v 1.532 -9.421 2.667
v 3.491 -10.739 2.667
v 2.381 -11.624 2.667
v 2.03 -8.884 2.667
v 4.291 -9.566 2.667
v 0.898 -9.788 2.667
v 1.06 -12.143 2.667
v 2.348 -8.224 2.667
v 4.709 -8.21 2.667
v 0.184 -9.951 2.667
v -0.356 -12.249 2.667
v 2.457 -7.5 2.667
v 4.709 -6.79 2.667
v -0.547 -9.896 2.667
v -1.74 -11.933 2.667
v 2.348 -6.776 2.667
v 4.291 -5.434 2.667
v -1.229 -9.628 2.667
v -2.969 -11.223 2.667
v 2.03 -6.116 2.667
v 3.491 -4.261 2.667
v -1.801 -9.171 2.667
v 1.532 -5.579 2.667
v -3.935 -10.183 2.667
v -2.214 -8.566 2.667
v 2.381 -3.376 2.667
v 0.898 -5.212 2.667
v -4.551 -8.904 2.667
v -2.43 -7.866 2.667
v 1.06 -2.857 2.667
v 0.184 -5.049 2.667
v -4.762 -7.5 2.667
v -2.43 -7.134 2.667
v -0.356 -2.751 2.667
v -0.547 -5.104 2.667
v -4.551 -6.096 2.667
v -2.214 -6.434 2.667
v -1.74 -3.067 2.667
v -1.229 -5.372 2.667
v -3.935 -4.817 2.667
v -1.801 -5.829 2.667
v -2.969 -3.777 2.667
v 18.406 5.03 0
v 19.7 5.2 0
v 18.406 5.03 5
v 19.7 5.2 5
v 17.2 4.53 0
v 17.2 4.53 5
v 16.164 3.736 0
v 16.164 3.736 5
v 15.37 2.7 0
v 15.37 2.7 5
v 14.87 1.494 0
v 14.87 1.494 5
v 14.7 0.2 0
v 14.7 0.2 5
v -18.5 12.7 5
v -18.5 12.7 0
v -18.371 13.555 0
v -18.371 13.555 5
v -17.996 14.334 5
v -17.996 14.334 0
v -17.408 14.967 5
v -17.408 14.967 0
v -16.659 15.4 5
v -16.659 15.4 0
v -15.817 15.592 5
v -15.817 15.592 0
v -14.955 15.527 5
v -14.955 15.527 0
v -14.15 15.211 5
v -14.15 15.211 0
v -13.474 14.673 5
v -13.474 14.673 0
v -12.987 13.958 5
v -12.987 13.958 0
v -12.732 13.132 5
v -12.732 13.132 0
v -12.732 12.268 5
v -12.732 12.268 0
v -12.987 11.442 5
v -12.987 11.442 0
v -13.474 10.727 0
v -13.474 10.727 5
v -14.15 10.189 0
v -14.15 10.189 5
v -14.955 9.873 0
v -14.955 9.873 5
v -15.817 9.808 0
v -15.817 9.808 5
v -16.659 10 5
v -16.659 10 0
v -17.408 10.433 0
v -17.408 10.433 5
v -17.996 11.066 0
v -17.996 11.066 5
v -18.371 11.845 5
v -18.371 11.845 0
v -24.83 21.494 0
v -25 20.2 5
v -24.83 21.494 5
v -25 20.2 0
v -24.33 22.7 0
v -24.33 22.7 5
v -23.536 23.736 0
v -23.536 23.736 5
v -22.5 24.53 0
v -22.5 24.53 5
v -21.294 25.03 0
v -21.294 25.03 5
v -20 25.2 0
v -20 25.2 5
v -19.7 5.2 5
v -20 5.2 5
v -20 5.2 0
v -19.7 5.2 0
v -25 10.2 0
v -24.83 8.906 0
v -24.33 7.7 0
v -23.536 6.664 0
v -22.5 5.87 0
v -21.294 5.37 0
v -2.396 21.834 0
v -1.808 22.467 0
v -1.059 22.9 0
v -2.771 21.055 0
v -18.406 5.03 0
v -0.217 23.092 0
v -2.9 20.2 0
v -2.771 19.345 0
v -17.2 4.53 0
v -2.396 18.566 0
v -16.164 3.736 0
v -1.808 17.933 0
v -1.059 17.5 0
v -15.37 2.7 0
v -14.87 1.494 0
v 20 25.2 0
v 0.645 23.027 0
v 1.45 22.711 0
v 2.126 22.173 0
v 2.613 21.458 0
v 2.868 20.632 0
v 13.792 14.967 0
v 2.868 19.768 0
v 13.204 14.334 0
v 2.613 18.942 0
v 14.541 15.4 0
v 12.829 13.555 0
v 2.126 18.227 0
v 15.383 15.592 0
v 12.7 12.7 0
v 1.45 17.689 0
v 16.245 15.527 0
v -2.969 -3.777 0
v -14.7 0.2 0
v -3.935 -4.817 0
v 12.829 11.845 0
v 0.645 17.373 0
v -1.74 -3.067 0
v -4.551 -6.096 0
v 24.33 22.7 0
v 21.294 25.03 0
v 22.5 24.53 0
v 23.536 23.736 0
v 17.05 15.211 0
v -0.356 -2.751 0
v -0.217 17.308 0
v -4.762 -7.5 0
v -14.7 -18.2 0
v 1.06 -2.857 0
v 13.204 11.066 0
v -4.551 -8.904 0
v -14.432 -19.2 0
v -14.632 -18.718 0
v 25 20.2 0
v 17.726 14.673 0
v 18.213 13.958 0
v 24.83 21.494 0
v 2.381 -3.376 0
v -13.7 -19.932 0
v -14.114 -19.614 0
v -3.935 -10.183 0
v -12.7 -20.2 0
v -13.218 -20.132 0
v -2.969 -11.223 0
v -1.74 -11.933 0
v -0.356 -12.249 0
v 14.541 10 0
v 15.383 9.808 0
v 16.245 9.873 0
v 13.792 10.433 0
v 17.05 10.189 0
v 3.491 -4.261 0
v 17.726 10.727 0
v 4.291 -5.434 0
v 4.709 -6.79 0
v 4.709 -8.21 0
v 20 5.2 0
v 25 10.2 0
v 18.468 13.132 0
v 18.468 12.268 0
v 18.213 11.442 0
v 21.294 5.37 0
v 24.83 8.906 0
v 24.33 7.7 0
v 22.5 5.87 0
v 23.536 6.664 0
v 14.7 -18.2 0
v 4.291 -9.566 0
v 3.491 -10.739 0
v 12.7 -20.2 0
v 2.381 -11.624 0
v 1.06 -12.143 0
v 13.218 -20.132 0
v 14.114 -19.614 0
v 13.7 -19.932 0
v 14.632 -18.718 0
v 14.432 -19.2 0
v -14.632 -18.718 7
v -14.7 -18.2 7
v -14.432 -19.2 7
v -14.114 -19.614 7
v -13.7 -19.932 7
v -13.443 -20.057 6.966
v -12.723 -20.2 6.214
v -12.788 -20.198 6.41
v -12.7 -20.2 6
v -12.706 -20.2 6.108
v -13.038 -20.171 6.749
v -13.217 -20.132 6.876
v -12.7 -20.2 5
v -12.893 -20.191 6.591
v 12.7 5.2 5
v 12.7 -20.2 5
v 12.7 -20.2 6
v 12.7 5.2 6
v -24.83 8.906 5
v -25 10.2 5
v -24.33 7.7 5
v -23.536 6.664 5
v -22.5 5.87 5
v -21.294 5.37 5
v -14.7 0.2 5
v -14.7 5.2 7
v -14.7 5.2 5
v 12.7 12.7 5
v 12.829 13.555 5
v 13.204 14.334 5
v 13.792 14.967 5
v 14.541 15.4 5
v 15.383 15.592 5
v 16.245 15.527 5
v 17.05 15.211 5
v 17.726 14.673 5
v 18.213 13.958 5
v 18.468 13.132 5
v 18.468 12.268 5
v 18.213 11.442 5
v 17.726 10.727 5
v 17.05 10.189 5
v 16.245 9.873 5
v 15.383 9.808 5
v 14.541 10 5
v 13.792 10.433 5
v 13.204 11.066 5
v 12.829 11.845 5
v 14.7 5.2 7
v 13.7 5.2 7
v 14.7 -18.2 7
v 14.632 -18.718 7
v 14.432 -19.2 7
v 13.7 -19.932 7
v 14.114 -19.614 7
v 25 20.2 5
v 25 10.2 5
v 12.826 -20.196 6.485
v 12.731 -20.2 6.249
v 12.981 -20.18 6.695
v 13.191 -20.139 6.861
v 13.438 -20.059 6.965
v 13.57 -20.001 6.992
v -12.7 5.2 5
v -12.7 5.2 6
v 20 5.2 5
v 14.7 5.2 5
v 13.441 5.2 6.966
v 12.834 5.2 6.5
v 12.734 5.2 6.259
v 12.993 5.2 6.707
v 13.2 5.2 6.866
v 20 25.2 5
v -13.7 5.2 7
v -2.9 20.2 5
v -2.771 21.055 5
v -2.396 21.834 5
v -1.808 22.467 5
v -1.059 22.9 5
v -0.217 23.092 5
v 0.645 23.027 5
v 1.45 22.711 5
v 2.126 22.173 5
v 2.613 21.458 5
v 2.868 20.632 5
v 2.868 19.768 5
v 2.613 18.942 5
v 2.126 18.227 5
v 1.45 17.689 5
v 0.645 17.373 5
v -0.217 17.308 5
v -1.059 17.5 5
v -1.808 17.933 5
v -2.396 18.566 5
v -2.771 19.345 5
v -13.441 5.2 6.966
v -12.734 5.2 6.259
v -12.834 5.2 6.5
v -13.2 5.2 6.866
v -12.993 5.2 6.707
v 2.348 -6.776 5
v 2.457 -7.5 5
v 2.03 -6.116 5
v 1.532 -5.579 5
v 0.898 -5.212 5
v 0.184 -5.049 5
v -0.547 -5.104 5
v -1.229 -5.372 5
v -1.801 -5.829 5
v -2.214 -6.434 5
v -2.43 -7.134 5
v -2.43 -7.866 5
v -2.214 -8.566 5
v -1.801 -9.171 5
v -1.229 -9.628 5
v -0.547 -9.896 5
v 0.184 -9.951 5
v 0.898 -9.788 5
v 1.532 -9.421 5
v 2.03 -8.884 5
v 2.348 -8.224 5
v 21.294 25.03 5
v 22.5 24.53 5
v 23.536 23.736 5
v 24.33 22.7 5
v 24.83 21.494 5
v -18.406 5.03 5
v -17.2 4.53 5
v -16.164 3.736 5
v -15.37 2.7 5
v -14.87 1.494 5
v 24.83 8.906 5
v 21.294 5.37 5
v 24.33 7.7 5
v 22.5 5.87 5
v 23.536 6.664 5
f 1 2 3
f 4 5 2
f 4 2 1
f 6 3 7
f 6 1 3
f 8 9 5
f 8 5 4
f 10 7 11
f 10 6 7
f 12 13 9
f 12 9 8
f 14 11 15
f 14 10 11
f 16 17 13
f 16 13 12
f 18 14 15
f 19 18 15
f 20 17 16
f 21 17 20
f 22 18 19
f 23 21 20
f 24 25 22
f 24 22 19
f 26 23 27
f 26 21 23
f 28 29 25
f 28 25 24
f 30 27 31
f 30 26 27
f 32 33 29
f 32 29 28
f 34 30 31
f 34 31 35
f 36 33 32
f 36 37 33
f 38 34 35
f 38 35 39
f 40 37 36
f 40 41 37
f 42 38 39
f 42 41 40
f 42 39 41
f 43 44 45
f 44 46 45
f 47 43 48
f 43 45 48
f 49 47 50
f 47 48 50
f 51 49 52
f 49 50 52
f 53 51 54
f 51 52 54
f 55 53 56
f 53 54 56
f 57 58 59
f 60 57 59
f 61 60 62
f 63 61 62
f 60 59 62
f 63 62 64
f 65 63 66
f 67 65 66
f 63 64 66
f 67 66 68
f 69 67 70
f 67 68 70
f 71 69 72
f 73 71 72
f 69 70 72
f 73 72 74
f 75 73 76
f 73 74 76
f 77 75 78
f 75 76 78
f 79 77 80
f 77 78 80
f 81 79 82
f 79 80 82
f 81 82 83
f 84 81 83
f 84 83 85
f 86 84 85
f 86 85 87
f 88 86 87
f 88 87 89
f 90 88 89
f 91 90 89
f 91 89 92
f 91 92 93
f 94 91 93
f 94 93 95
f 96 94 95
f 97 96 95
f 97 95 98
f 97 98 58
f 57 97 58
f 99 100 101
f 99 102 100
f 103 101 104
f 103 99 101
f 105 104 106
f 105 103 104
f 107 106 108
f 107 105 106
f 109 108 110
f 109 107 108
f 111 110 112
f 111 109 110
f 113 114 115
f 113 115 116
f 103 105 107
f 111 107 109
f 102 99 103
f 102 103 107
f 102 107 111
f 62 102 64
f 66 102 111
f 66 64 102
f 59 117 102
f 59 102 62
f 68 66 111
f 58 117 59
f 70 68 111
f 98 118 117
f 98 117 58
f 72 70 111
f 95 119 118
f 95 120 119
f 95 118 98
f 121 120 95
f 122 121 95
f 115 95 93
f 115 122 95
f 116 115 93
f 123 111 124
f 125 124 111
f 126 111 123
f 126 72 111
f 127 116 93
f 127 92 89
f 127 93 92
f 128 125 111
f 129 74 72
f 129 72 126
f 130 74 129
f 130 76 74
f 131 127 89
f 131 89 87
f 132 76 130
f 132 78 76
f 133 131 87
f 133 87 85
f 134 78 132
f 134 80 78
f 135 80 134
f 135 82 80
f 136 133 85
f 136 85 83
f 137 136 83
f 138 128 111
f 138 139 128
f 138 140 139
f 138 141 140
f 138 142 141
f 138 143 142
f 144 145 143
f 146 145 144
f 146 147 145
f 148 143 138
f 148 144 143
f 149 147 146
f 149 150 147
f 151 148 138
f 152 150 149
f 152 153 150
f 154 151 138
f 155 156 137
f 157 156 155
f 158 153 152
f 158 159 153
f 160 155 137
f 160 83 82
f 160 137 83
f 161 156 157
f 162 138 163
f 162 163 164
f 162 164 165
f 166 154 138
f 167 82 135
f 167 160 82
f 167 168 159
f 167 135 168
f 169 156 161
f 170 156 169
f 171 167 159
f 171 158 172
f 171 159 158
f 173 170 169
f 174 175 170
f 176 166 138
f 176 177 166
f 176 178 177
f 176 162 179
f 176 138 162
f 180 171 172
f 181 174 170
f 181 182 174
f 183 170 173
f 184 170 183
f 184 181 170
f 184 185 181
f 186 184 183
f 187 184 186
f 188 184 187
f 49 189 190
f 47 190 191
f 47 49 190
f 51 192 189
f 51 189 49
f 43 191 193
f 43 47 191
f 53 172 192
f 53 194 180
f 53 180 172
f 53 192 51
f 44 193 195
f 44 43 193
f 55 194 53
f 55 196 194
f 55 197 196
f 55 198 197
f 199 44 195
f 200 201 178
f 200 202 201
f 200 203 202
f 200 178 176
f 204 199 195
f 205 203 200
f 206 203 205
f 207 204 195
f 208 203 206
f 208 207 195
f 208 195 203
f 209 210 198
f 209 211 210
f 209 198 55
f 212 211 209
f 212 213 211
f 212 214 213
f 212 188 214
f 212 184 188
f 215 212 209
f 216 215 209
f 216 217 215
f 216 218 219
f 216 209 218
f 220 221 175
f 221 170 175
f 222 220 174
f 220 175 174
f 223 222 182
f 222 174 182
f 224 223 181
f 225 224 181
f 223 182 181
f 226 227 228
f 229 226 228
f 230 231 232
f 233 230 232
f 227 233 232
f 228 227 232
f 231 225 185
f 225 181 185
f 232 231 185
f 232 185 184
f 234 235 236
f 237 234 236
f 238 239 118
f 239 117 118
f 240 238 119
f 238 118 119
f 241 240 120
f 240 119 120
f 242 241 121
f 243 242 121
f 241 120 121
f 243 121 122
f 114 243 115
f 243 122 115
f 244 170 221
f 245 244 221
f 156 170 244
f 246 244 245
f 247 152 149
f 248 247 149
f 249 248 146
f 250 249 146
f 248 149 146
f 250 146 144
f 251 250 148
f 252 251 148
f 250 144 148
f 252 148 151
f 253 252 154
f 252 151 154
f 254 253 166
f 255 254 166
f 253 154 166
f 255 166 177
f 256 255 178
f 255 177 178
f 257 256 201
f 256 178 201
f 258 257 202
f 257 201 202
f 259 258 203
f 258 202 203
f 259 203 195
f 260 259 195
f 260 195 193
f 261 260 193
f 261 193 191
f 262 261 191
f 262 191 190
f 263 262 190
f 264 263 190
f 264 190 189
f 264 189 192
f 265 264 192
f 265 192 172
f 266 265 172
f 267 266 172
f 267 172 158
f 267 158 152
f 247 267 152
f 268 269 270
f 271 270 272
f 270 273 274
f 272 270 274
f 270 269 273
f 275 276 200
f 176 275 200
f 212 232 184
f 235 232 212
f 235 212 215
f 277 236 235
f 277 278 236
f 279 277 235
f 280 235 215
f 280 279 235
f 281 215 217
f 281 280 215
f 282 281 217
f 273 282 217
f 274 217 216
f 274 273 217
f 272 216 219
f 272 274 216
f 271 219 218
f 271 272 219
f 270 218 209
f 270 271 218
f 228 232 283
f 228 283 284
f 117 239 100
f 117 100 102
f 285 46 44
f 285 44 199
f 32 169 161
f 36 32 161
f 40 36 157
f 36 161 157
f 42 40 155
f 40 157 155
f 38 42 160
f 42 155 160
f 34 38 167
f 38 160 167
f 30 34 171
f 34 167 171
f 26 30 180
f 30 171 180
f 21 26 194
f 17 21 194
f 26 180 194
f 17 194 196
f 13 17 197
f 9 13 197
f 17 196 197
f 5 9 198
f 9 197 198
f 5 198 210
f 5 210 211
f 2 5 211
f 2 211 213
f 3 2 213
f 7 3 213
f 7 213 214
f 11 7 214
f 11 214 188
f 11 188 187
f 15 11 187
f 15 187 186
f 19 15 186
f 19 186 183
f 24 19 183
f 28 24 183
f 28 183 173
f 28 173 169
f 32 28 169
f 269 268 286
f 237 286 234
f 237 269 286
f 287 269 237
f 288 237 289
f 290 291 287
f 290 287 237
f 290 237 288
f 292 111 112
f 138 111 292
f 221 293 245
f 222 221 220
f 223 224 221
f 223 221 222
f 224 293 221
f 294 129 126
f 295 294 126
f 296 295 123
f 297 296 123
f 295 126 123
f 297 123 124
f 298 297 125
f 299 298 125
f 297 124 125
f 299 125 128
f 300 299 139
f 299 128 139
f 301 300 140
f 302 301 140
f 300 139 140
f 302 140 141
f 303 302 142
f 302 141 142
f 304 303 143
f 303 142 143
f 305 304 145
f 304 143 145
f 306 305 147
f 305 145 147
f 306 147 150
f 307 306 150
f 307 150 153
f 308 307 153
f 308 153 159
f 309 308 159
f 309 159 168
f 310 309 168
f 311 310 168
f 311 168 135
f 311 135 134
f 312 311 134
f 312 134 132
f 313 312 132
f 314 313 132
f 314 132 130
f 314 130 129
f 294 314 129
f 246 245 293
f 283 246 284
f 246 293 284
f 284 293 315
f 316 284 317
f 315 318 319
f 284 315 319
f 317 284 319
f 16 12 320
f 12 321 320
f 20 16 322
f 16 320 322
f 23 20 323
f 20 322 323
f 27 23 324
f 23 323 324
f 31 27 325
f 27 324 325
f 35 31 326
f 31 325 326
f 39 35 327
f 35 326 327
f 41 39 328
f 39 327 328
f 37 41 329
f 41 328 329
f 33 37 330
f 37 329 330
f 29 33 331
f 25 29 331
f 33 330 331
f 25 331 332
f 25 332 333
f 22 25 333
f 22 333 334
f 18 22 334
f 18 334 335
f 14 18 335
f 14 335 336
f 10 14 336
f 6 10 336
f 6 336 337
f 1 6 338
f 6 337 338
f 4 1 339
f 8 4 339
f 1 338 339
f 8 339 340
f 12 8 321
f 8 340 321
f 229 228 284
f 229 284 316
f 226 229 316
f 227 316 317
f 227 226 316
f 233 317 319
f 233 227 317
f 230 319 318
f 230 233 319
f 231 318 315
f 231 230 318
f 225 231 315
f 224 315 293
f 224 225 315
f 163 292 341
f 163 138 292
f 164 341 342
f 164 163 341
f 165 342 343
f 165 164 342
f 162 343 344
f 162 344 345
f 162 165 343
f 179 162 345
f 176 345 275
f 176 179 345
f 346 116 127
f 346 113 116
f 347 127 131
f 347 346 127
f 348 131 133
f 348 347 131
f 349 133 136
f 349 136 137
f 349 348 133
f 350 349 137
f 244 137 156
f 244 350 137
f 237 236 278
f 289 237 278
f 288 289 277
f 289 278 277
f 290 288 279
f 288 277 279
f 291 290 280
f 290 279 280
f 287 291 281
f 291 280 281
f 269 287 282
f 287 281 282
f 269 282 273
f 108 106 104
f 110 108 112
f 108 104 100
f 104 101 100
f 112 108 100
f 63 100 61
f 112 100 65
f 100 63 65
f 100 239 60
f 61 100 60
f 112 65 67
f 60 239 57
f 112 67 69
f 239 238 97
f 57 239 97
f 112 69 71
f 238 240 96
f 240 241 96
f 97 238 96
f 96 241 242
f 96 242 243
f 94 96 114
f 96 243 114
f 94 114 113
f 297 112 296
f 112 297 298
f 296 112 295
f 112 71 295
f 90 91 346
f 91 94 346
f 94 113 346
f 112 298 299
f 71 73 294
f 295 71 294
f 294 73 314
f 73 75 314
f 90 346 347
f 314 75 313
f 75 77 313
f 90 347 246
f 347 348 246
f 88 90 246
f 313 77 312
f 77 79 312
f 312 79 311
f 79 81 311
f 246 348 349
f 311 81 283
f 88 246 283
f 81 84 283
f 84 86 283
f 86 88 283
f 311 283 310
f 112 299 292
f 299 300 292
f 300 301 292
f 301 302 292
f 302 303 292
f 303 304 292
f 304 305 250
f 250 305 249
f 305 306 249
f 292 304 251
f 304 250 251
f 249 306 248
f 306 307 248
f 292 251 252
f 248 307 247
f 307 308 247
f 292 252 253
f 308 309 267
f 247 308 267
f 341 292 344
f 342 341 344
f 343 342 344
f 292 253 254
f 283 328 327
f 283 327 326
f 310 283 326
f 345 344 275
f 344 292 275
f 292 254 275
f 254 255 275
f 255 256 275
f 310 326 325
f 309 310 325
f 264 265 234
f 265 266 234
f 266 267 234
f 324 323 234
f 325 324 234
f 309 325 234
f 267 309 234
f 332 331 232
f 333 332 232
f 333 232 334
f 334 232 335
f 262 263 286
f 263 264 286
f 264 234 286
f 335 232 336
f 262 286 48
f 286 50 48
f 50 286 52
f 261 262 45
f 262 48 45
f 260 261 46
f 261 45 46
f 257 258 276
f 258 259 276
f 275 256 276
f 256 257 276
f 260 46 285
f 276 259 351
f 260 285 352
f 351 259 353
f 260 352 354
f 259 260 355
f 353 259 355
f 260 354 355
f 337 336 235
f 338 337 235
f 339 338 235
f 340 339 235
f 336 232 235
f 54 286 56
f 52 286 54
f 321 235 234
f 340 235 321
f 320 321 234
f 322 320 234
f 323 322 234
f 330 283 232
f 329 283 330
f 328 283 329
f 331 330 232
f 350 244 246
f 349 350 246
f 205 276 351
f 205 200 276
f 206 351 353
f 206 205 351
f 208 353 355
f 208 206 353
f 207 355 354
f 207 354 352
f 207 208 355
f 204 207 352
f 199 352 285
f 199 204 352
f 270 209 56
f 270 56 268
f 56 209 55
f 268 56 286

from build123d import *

# Parameters (mm, degrees)
SKETCH7_W                                           = 29.4
SKETCH7_H                                           = 40.4
BOSS_EXTRUDE3_DEPTH                                 = 5
BOSS_EXTRUDE4_DEPTH                                 = 25.4
SKETCH11_W                                          = 50
SKETCH11_H                                          = 15
BOSS_EXTRUDE5_DEPTH                                 = 5
CBORE_FOR_8_BINDING_HEAD_MACHINE_SCREW1_D           = 4.9149
CBORE_FOR_8_BINDING_HEAD_MACHINE_SCREW1_CBORE_D     = 9.525
CBORE_FOR_8_BINDING_HEAD_MACHINE_SCREW1_CBORE_DEPTH = 2.667
SKETCH18_W                                          = 50
SKETCH18_H                                          = 5
BOSS_EXTRUDE6_DEPTH                                 = 5
M5_CLEARANCE_HOLE1_D                                = 5.8
FILLET2_R                                           = 5
FILLET3_R                                           = 2


with BuildPart() as part:
    # Sketch7 → Boss-Extrude3 (new body)
    with BuildSketch(Plane.XY):
        Rectangle(SKETCH7_W, SKETCH7_H)
    extrude(amount=BOSS_EXTRUDE3_DEPTH)

    # Sketch8 → Boss-Extrude4 (add)
    with BuildSketch(Plane.XZ.offset(20.2)):
        with BuildLine():
            Line((-14.7, 5), (-12.7, 5))
            Line((-12.7, 5), (-12.7, 6))
            ThreePointArc((-12.7, 6), (-12.992893219, 6.707106781), (-13.7, 7))
            Line((-13.7, 7), (-14.7, 7))
            Line((-14.7, 7), (-14.7, 5))
        make_face()
        with BuildLine():
            Line((14.7, 5), (12.7, 5))
            Line((12.7, 5), (12.7, 6))
            ThreePointArc((12.7, 6), (12.992893219, 6.707106781), (13.7, 7))
            Line((13.7, 7), (14.7, 7))
            Line((14.7, 7), (14.7, 5))
        make_face()
    extrude(amount=-BOSS_EXTRUDE4_DEPTH)

    # Sketch11 → Boss-Extrude5 (add)
    with BuildSketch(Plane.XY.offset(5)):
        with Locations((0, 12.7)):
            Rectangle(SKETCH11_W, SKETCH11_H)
    extrude(amount=-BOSS_EXTRUDE5_DEPTH)

    # CBORE for #8 Binding Head Machine Screw1 (through all)
    with Locations(Plane(origin=(0, 0, 0), x_dir=(-1, 0, 0), z_dir=(0, 0, -1))):
        with Locations((0, -7.5)):
            CounterBoreHole(CBORE_FOR_8_BINDING_HEAD_MACHINE_SCREW1_D / 2, CBORE_FOR_8_BINDING_HEAD_MACHINE_SCREW1_CBORE_D / 2, CBORE_FOR_8_BINDING_HEAD_MACHINE_SCREW1_CBORE_DEPTH)

    # Sketch18 → Boss-Extrude6 (add)
    with BuildSketch(Plane(origin=(0, 20.2, 0), x_dir=(1, 0, 0), z_dir=(0, 1, 0))):
        with Locations((0, -2.5)):
            Rectangle(SKETCH18_W, SKETCH18_H)
    extrude(amount=BOSS_EXTRUDE6_DEPTH)

    # M5 Clearance Hole1 (through all)
    with Locations(Plane.XY.offset(5)):
        with Locations((-15.6, 12.7), (15.6, 12.7), (0, 20.2)):
            Hole(M5_CLEARANCE_HOLE1_D / 2)

    # Fillet2
    fillet2_edges = [part.edges().sort_by_distance(p)[0] for p in [
        (25, 5.2, 2.5),
        (-25, 5.2, 2.5),
        (-14.7, 5.2, 2.5),
        (14.7, 5.2, 2.5),
        (-25, 25.2, 2.5),
        (25, 25.2, 2.5),
    ]]
    fillet(fillet2_edges, radius=FILLET2_R)

    # Fillet3
    fillet3_edges = [part.edges().sort_by_distance(p)[0] for p in [
        (14.7, -20.2, 3.5),
        (-14.7, -20.2, 3.5),
    ]]
    fillet(fillet3_edges, radius=FILLET3_R)


solid = part.part
